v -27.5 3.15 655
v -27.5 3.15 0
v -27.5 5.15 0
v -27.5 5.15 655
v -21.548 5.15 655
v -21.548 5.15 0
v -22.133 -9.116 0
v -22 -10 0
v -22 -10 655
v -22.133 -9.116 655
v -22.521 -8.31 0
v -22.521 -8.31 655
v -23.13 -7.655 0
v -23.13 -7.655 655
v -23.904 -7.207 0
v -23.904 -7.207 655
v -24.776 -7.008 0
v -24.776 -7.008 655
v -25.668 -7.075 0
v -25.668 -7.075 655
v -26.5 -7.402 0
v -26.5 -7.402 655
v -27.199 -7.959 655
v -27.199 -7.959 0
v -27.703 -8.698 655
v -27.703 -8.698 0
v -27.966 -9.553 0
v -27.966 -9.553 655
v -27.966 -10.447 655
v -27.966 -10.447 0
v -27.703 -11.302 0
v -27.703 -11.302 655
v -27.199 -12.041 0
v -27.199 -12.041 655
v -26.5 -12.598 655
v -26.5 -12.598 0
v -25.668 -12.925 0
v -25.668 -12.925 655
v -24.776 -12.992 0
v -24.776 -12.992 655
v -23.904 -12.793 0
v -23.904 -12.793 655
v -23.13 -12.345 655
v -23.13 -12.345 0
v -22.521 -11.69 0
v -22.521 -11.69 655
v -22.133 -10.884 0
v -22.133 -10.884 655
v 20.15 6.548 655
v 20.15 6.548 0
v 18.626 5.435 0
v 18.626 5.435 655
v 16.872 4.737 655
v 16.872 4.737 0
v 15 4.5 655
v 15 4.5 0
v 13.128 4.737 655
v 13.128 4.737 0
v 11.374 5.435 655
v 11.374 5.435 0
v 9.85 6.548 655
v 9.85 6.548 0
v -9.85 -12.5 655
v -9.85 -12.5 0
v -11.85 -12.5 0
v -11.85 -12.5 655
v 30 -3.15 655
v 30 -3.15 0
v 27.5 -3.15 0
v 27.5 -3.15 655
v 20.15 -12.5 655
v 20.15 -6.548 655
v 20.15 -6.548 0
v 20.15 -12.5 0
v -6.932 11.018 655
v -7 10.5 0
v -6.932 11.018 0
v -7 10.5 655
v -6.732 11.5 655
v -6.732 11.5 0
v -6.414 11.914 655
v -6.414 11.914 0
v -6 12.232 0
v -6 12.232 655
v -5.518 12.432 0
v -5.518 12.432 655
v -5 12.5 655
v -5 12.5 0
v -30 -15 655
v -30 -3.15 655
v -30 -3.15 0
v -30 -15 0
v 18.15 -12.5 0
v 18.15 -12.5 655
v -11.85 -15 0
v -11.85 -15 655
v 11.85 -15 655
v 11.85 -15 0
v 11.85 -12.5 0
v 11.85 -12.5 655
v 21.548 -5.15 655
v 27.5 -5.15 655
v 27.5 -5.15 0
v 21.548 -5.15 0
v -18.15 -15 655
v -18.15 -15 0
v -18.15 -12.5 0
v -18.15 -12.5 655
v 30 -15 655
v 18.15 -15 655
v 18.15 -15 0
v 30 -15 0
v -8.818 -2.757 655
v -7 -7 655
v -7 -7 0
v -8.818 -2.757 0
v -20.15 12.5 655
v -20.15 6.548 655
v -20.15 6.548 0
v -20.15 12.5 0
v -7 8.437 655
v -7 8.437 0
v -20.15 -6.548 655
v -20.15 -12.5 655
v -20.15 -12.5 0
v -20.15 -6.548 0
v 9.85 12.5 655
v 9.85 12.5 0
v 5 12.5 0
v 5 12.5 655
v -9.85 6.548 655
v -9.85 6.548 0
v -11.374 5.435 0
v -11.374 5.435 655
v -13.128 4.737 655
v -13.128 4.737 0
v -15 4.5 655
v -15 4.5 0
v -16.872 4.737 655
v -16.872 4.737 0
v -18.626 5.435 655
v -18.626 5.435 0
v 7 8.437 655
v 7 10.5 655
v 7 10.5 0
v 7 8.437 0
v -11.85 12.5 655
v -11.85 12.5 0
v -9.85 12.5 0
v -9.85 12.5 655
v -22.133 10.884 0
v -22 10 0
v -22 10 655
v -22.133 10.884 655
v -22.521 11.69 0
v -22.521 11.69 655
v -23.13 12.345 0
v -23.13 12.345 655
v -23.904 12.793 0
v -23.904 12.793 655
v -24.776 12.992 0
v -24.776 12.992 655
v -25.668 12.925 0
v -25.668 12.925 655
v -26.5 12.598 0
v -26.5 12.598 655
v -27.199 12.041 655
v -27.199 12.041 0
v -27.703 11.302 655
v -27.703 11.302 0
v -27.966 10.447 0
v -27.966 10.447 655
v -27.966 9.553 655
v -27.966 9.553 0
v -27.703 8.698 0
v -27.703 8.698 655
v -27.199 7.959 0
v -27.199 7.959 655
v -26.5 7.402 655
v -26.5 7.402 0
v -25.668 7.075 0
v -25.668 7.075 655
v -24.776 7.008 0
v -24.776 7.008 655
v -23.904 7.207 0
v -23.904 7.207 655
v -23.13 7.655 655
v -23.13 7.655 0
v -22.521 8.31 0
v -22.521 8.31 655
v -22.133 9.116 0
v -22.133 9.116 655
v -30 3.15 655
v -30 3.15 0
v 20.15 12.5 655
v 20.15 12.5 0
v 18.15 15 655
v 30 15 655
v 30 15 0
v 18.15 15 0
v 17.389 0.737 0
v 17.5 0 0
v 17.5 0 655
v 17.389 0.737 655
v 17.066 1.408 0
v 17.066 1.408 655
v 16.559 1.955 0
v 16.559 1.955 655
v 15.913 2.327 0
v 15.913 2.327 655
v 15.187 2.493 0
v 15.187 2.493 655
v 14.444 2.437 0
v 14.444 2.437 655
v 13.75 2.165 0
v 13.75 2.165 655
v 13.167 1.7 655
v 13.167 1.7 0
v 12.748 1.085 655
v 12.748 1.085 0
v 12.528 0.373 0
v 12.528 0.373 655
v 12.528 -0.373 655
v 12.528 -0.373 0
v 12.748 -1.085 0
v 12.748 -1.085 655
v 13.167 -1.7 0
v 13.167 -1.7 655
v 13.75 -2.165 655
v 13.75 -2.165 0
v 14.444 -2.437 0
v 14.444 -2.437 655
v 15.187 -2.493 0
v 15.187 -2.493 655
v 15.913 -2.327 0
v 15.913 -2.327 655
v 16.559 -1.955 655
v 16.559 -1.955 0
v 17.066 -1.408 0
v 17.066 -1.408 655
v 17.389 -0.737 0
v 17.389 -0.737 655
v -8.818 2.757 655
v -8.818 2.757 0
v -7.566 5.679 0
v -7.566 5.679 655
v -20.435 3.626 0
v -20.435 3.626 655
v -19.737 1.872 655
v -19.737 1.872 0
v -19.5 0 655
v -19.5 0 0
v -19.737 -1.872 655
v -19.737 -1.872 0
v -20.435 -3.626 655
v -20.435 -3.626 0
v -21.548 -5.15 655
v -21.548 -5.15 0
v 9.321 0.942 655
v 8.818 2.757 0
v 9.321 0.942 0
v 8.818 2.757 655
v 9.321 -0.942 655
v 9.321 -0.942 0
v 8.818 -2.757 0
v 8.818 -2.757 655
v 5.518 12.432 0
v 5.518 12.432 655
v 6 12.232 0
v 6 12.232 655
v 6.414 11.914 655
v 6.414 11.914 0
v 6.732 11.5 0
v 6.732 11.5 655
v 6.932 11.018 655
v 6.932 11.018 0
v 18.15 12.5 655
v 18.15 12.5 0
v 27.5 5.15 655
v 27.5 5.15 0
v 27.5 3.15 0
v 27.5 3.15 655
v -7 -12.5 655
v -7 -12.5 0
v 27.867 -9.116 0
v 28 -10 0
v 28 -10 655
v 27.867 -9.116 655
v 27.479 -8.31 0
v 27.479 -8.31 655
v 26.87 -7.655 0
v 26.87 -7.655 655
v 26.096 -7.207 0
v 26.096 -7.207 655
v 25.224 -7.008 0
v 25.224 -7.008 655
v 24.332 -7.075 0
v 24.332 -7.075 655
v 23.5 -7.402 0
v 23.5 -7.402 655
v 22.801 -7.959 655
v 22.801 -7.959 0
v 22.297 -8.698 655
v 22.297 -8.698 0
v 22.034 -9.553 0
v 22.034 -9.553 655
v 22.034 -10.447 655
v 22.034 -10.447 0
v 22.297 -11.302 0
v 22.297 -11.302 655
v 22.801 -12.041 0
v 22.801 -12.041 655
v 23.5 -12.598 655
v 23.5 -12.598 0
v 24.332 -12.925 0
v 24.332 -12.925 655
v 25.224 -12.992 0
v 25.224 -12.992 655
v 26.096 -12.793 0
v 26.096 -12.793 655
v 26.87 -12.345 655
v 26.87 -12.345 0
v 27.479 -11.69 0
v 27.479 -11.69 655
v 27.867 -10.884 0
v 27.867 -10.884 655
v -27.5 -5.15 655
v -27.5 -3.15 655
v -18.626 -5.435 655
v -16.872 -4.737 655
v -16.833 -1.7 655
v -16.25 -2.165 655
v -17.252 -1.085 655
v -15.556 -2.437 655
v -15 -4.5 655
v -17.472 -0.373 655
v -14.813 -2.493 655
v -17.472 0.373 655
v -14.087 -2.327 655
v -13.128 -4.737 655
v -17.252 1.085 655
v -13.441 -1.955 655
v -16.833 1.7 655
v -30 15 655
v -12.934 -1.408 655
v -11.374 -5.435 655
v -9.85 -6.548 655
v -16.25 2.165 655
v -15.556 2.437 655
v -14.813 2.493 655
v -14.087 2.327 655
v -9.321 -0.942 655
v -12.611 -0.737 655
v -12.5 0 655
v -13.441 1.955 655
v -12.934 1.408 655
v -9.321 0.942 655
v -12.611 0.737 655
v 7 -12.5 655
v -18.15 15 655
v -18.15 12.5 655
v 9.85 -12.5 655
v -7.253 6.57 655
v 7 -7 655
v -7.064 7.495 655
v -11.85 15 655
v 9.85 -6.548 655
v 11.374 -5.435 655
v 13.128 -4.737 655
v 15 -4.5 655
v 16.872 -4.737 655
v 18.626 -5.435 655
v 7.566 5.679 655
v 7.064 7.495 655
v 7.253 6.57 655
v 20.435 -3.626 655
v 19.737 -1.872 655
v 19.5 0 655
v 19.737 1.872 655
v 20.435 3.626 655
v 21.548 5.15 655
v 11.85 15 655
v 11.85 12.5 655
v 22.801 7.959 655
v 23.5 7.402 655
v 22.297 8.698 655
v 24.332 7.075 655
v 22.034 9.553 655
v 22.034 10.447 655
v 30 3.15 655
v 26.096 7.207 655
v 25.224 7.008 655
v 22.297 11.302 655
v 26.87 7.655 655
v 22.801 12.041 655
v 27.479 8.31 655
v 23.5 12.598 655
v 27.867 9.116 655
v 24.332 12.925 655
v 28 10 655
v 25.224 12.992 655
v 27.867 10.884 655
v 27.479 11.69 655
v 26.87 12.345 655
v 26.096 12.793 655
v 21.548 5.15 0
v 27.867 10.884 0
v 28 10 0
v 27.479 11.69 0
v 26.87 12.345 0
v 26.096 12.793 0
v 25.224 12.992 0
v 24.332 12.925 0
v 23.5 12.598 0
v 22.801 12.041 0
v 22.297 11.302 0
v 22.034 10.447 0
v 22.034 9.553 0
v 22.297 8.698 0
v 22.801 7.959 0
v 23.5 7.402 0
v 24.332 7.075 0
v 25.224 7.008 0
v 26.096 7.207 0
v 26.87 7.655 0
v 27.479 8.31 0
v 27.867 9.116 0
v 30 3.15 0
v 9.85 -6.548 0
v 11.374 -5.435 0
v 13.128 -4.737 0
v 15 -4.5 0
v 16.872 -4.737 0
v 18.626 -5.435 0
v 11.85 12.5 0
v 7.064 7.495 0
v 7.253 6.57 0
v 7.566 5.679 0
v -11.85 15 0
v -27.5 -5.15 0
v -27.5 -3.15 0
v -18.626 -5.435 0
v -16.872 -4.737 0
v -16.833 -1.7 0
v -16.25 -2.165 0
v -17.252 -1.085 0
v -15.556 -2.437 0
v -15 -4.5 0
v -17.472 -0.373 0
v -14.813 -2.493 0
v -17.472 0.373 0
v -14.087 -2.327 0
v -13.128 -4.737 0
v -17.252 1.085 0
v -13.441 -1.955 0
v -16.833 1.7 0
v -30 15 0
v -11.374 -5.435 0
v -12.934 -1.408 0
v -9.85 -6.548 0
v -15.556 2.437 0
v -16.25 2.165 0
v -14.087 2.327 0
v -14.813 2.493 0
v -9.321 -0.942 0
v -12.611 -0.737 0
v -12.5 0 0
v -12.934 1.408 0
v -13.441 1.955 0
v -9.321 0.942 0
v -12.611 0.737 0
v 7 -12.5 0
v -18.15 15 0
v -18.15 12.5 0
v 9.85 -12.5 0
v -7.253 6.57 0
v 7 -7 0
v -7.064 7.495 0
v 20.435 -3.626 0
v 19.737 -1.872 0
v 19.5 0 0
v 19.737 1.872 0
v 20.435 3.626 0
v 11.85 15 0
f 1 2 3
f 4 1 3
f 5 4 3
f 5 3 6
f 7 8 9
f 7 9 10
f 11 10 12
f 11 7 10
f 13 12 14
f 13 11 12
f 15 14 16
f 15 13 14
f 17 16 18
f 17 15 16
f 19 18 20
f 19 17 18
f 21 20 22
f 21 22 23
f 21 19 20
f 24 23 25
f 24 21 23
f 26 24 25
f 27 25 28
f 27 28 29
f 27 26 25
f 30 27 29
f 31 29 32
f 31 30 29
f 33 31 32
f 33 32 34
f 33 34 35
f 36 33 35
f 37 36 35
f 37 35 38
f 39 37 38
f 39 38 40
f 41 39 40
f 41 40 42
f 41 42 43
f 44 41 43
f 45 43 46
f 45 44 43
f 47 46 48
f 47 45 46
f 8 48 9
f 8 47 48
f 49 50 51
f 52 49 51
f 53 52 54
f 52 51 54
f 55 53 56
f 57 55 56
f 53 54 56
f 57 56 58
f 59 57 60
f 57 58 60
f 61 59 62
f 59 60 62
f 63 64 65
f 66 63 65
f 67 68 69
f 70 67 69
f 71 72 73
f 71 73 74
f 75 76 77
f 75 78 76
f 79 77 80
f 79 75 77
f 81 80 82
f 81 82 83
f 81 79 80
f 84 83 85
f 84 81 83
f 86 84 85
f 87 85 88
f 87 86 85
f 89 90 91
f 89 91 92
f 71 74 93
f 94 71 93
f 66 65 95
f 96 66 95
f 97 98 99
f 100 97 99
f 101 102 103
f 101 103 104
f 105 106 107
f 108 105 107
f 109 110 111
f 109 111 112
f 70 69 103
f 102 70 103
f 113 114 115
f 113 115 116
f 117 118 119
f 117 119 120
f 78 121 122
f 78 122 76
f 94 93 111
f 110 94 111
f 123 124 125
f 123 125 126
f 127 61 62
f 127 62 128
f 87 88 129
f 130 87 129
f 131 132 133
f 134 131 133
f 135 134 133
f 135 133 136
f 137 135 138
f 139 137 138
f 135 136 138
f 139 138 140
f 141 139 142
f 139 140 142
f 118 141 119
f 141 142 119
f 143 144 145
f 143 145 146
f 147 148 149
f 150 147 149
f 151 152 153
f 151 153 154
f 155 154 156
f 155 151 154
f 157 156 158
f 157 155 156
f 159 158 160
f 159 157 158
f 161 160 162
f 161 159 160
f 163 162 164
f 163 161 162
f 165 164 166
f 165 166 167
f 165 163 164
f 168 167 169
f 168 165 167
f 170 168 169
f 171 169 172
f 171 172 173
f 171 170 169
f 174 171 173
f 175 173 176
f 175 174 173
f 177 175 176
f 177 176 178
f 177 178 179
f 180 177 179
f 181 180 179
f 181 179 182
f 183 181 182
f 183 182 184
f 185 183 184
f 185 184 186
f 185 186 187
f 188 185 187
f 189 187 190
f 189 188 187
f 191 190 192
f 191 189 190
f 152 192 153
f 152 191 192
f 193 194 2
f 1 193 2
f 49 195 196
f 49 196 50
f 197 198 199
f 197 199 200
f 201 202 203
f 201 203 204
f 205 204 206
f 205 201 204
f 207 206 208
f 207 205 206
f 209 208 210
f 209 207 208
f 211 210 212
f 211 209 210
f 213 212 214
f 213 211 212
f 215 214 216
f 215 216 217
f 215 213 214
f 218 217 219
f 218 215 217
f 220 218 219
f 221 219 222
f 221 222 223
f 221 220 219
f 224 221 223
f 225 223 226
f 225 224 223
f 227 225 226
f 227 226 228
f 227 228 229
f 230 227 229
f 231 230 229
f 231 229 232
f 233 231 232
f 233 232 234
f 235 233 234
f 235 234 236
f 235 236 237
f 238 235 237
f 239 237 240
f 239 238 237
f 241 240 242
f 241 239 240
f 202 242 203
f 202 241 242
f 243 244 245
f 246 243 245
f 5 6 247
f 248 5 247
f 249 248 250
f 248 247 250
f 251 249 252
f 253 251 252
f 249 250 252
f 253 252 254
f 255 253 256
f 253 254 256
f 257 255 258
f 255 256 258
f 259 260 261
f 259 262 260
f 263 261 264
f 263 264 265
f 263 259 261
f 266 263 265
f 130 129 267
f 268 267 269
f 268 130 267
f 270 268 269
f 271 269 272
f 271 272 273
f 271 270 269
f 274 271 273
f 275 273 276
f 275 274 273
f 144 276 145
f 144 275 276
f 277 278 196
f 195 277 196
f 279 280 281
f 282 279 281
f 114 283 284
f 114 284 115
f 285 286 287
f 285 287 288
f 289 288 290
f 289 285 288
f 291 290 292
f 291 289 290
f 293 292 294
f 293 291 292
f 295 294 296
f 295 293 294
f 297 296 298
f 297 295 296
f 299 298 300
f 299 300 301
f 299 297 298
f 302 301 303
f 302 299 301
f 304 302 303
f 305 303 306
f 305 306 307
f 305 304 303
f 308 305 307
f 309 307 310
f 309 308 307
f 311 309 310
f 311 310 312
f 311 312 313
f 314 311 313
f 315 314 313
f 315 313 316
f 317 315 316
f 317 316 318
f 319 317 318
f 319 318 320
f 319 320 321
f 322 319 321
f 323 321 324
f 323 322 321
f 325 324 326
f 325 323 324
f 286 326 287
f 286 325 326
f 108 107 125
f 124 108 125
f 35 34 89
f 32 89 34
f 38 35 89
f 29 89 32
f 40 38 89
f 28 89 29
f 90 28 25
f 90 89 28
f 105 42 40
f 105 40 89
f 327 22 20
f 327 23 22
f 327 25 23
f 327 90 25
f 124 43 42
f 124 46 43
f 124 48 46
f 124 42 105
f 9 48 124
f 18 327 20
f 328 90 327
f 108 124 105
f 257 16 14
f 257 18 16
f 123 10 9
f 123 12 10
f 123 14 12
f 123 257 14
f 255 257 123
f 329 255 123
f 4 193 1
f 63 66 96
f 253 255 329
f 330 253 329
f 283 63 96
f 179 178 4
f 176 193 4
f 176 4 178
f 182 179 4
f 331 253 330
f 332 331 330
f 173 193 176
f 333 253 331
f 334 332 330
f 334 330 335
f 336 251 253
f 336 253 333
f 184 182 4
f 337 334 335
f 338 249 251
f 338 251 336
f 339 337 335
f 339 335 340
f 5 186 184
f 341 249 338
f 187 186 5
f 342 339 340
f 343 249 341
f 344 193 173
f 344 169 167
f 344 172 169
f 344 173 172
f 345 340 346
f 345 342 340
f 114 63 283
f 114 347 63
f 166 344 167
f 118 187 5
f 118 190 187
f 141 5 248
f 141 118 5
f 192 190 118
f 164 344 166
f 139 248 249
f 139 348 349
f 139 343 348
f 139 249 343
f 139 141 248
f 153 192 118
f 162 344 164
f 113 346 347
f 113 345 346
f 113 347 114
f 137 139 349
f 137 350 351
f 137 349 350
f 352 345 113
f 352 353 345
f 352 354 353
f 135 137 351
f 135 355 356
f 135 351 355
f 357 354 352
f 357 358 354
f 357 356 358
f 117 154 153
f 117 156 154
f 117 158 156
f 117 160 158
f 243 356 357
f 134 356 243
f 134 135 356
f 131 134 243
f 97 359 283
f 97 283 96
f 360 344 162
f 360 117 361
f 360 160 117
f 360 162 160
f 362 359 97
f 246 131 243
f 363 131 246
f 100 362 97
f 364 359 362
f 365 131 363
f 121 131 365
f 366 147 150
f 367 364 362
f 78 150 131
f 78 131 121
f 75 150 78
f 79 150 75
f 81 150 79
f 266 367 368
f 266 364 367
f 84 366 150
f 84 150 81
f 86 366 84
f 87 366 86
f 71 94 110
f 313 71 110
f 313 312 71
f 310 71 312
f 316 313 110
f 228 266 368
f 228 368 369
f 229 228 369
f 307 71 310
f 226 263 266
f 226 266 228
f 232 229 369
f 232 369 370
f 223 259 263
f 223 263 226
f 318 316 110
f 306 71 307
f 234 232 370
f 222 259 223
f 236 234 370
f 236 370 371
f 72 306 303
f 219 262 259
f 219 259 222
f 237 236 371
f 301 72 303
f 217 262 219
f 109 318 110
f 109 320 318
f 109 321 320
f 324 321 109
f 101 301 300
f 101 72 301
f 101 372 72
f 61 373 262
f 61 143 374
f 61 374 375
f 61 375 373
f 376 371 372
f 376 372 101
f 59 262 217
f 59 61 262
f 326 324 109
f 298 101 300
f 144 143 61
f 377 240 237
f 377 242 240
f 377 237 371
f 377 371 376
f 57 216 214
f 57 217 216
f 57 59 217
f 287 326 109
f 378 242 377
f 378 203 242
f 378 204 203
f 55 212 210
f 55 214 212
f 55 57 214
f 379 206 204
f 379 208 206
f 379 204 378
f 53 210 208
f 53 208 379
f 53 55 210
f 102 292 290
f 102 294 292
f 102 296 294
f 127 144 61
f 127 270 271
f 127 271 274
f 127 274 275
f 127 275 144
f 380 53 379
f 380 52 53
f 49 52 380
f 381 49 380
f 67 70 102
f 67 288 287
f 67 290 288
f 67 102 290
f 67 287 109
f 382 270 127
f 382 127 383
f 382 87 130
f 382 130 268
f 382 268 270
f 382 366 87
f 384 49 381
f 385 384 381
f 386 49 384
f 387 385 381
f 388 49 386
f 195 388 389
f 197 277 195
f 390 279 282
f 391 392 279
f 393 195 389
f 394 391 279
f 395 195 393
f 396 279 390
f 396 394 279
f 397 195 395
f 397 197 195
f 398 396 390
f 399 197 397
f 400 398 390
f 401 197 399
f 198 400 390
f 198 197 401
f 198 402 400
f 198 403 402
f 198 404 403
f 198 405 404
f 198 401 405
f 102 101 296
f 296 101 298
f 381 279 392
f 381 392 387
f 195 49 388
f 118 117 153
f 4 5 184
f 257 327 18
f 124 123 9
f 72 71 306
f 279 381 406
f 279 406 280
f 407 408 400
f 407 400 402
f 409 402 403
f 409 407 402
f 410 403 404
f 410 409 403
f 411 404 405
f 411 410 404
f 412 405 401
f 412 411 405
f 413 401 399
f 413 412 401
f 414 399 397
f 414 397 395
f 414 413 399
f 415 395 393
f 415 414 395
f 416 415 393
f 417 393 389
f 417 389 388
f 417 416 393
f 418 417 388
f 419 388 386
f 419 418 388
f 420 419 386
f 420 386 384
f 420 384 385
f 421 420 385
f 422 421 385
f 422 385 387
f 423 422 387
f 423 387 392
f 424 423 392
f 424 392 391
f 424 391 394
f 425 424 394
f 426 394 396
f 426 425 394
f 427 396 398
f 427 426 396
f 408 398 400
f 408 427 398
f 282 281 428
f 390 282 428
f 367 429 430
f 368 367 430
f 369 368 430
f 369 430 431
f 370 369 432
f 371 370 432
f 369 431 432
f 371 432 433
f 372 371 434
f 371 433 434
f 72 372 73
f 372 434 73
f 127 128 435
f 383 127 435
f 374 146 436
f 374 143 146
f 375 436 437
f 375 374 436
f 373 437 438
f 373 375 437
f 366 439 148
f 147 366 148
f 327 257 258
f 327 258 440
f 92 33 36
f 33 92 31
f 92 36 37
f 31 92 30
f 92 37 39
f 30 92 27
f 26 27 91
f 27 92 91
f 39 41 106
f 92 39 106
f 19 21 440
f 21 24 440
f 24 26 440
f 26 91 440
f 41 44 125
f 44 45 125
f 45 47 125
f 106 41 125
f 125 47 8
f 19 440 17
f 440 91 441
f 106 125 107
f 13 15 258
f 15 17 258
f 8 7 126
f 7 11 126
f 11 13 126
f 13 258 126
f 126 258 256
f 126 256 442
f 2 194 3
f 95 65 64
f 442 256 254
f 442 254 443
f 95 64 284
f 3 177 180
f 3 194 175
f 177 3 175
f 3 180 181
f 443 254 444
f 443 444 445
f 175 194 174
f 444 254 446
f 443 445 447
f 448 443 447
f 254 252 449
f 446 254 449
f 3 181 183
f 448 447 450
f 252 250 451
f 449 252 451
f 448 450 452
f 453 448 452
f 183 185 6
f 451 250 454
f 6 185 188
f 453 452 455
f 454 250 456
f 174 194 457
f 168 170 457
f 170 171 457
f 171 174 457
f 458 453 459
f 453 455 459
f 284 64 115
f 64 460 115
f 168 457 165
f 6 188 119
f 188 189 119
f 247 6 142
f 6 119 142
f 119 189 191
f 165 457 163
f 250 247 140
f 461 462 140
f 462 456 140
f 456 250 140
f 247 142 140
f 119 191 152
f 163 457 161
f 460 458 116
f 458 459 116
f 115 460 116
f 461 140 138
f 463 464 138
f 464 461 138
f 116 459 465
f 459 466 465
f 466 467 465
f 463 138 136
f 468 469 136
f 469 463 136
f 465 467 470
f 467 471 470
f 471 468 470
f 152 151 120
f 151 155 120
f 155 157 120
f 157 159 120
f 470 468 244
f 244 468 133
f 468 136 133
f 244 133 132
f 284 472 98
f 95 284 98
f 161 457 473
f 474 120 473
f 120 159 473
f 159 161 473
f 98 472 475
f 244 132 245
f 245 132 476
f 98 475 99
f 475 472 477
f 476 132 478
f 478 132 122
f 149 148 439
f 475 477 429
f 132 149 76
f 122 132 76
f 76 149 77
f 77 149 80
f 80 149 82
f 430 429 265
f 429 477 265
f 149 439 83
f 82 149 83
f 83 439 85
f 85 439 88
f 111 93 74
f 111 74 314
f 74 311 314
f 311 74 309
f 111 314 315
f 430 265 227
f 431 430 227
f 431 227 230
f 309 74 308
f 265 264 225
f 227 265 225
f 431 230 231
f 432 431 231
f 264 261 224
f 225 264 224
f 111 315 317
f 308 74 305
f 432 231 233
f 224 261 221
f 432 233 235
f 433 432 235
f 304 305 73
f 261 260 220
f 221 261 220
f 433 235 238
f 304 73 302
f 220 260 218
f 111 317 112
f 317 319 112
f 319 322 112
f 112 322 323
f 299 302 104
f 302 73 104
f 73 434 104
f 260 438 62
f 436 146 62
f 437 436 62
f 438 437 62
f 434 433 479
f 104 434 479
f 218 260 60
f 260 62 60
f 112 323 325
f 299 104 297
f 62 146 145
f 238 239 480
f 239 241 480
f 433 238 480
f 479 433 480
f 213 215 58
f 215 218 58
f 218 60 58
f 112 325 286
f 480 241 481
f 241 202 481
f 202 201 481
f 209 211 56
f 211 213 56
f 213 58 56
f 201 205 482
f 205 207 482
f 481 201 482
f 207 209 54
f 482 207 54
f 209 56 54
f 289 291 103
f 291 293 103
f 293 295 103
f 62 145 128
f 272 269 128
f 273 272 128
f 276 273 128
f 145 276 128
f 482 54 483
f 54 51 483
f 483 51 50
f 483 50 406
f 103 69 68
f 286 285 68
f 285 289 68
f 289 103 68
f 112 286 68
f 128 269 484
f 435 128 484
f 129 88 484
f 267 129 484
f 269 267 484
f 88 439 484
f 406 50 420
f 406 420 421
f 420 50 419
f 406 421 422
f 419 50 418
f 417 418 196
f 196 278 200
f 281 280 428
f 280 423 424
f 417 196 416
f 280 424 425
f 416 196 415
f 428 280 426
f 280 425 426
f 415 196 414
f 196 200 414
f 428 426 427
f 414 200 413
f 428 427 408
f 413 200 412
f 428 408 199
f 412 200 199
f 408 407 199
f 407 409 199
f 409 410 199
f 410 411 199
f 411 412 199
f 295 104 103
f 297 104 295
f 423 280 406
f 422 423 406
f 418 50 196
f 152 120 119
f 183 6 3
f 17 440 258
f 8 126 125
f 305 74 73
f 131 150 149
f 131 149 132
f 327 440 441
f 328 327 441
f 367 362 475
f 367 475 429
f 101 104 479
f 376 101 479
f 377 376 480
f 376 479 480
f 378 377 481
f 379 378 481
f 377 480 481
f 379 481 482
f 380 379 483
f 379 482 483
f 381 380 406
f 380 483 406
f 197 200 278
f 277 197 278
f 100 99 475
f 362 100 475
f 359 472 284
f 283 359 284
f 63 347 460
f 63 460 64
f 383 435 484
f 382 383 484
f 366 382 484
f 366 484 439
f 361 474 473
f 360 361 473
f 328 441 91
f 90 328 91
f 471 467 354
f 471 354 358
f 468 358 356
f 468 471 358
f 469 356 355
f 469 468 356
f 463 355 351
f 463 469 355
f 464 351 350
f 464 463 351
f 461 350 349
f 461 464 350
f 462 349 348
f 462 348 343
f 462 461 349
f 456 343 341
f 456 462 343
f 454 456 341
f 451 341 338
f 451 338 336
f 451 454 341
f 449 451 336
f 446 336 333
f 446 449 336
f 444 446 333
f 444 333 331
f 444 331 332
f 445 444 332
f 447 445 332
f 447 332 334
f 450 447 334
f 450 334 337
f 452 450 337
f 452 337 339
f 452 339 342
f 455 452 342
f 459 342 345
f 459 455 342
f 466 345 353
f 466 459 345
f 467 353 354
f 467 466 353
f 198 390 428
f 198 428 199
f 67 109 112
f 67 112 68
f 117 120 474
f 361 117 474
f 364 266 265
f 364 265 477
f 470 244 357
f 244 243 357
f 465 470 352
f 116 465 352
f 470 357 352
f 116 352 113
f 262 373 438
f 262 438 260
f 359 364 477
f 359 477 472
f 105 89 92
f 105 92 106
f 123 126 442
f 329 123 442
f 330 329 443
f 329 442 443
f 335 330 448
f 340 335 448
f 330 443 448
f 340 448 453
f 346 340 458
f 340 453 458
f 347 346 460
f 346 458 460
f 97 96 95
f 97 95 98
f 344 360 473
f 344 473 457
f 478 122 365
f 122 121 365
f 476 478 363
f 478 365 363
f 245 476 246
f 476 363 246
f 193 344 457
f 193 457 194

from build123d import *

# Parameters (mm, degrees)
F0_R     = 3
F0_R_2   = 2.5
F1_DEPTH = 655
F2_R     = 2
F3_R     = 7


# Not quite as in the source:
# - a feature names something its author has since deleted; it is built from what else it names


with BuildPart() as f1:
    # F0 (on Top) → F1 (new body)
    with BuildSketch(Plane.XY):
        with BuildLine():
            Line((18.15, -15), (30, -15))
            Line((30, -15), (30, -3.15))
            Line((30, -3.15), (27.5, -3.15))
            Line((27.5, -3.15), (27.5, -5.15))
            Line((27.5, -5.15), (21.5477069044, -5.15))
            ThreePointArc((21.5477069044, -5.15), (19.5, 0), (21.5477069044, 5.15))
            Line((21.5477069044, 5.15), (27.5, 5.15))
            Line((27.5, 5.15), (27.5, 3.15))
            Line((27.5, 3.15), (30, 3.15))
            Line((30, 3.15), (30, 15))
            Line((30, 15), (18.15, 15))
            Line((18.15, 15), (18.15, 12.5))
            Line((18.15, 12.5), (20.15, 12.5))
            Line((20.15, 12.5), (20.15, 6.5477069044))
            ThreePointArc((20.15, 6.5477069044), (15, 4.5), (9.85, 6.5477069044))
            Line((9.85, 6.5477069044), (9.85, 12.5))
            Line((9.85, 12.5), (11.85, 12.5))
            Line((11.85, 12.5), (11.85, 15))
            Line((11.85, 15), (-11.85, 15))
            Line((-11.85, 15), (-11.85, 12.5))
            Line((-11.85, 12.5), (-9.85, 12.5))
            Line((-9.85, 12.5), (-9.85, 6.5477069044))
            ThreePointArc((-9.85, 6.5477069044), (-15, 4.5), (-20.15, 6.5477069044))
            Line((-20.15, 6.5477069044), (-20.15, 12.5))
            Line((-20.15, 12.5), (-18.15, 12.5))
            Line((-18.15, 12.5), (-18.15, 15))
            Line((-18.15, 15), (-30, 15))
            Line((-30, 15), (-30, 3.15))
            Line((-30, 3.15), (-27.5, 3.15))
            Line((-27.5, 3.15), (-27.5, 5.15))
            Line((-27.5, 5.15), (-21.5477069044, 5.15))
            ThreePointArc((-21.5477069044, 5.15), (-19.5, 0), (-21.5477069044, -5.15))
            Line((-21.5477069044, -5.15), (-27.5, -5.15))
            Line((-27.5, -5.15), (-27.5, -3.15))
            Line((-27.5, -3.15), (-30, -3.15))
            Line((-30, -3.15), (-30, -15))
            Line((-30, -15), (-18.15, -15))
            Line((-18.15, -15), (-18.15, -12.5))
            Line((-18.15, -12.5), (-20.15, -12.5))
            Line((-20.15, -12.5), (-20.15, -6.5477069044))
            ThreePointArc((-20.15, -6.5477069044), (-15, -4.5), (-9.85, -6.5477069044))
            Line((-9.85, -6.5477069044), (-9.85, -12.5))
            Line((-9.85, -12.5), (-11.85, -12.5))
            Line((-11.85, -12.5), (-11.85, -15))
            Line((-11.85, -15), (11.85, -15))
            Line((11.85, -15), (11.85, -12.5))
            Line((11.85, -12.5), (9.85, -12.5))
            Line((9.85, -12.5), (9.85, -6.5477069044))
            ThreePointArc((9.85, -6.5477069044), (15, -4.5), (20.15, -6.5477069044))
            Line((20.15, -6.5477069044), (20.15, -12.5))
            Line((20.15, -12.5), (18.15, -12.5))
            Line((18.15, -12.5), (18.15, -15))
        make_face()
        with Locations((-25, -10)):
            Circle(F0_R, mode=Mode.SUBTRACT)
        with Locations((25, -10)):
            Circle(F0_R, mode=Mode.SUBTRACT)
        with Locations((-15, 0)):
            Circle(F0_R_2, mode=Mode.SUBTRACT)
        with Locations((-25, 10)):
            Circle(F0_R, mode=Mode.SUBTRACT)
        Polygon((-7, 7), (-7, 12.5), (0, 12.5), (7, 12.5), (7, 7), (10, 0), (7, -7), (7, -12.5), (0, -12.5), (-7, -12.5), (-7, -7), (-10, 0), align=None, mode=Mode.SUBTRACT)
        with Locations((15, 0)):
            Circle(F0_R_2, mode=Mode.SUBTRACT)
        with Locations((25, 10)):
            Circle(F0_R, mode=Mode.SUBTRACT)
    extrude(amount=F1_DEPTH)

    # F2
    f2_edges = [f1.edges().sort_by_distance(p)[0] for p in [
        (-7, 12.5, 327.5),
        (7, 12.5, 327.5),
    ]]
    fillet(f2_edges, radius=F2_R)

    # F3
    f3_edges = [f1.edges().sort_by_distance(p)[0] for p in [
        (-7, 7, 327.5),
        (-10, 0, 327.5),
        (7, 7, 327.5),
        (10, 0, 327.5),
    ]]
    fillet(f3_edges, radius=F3_R)


solid = f1.part
